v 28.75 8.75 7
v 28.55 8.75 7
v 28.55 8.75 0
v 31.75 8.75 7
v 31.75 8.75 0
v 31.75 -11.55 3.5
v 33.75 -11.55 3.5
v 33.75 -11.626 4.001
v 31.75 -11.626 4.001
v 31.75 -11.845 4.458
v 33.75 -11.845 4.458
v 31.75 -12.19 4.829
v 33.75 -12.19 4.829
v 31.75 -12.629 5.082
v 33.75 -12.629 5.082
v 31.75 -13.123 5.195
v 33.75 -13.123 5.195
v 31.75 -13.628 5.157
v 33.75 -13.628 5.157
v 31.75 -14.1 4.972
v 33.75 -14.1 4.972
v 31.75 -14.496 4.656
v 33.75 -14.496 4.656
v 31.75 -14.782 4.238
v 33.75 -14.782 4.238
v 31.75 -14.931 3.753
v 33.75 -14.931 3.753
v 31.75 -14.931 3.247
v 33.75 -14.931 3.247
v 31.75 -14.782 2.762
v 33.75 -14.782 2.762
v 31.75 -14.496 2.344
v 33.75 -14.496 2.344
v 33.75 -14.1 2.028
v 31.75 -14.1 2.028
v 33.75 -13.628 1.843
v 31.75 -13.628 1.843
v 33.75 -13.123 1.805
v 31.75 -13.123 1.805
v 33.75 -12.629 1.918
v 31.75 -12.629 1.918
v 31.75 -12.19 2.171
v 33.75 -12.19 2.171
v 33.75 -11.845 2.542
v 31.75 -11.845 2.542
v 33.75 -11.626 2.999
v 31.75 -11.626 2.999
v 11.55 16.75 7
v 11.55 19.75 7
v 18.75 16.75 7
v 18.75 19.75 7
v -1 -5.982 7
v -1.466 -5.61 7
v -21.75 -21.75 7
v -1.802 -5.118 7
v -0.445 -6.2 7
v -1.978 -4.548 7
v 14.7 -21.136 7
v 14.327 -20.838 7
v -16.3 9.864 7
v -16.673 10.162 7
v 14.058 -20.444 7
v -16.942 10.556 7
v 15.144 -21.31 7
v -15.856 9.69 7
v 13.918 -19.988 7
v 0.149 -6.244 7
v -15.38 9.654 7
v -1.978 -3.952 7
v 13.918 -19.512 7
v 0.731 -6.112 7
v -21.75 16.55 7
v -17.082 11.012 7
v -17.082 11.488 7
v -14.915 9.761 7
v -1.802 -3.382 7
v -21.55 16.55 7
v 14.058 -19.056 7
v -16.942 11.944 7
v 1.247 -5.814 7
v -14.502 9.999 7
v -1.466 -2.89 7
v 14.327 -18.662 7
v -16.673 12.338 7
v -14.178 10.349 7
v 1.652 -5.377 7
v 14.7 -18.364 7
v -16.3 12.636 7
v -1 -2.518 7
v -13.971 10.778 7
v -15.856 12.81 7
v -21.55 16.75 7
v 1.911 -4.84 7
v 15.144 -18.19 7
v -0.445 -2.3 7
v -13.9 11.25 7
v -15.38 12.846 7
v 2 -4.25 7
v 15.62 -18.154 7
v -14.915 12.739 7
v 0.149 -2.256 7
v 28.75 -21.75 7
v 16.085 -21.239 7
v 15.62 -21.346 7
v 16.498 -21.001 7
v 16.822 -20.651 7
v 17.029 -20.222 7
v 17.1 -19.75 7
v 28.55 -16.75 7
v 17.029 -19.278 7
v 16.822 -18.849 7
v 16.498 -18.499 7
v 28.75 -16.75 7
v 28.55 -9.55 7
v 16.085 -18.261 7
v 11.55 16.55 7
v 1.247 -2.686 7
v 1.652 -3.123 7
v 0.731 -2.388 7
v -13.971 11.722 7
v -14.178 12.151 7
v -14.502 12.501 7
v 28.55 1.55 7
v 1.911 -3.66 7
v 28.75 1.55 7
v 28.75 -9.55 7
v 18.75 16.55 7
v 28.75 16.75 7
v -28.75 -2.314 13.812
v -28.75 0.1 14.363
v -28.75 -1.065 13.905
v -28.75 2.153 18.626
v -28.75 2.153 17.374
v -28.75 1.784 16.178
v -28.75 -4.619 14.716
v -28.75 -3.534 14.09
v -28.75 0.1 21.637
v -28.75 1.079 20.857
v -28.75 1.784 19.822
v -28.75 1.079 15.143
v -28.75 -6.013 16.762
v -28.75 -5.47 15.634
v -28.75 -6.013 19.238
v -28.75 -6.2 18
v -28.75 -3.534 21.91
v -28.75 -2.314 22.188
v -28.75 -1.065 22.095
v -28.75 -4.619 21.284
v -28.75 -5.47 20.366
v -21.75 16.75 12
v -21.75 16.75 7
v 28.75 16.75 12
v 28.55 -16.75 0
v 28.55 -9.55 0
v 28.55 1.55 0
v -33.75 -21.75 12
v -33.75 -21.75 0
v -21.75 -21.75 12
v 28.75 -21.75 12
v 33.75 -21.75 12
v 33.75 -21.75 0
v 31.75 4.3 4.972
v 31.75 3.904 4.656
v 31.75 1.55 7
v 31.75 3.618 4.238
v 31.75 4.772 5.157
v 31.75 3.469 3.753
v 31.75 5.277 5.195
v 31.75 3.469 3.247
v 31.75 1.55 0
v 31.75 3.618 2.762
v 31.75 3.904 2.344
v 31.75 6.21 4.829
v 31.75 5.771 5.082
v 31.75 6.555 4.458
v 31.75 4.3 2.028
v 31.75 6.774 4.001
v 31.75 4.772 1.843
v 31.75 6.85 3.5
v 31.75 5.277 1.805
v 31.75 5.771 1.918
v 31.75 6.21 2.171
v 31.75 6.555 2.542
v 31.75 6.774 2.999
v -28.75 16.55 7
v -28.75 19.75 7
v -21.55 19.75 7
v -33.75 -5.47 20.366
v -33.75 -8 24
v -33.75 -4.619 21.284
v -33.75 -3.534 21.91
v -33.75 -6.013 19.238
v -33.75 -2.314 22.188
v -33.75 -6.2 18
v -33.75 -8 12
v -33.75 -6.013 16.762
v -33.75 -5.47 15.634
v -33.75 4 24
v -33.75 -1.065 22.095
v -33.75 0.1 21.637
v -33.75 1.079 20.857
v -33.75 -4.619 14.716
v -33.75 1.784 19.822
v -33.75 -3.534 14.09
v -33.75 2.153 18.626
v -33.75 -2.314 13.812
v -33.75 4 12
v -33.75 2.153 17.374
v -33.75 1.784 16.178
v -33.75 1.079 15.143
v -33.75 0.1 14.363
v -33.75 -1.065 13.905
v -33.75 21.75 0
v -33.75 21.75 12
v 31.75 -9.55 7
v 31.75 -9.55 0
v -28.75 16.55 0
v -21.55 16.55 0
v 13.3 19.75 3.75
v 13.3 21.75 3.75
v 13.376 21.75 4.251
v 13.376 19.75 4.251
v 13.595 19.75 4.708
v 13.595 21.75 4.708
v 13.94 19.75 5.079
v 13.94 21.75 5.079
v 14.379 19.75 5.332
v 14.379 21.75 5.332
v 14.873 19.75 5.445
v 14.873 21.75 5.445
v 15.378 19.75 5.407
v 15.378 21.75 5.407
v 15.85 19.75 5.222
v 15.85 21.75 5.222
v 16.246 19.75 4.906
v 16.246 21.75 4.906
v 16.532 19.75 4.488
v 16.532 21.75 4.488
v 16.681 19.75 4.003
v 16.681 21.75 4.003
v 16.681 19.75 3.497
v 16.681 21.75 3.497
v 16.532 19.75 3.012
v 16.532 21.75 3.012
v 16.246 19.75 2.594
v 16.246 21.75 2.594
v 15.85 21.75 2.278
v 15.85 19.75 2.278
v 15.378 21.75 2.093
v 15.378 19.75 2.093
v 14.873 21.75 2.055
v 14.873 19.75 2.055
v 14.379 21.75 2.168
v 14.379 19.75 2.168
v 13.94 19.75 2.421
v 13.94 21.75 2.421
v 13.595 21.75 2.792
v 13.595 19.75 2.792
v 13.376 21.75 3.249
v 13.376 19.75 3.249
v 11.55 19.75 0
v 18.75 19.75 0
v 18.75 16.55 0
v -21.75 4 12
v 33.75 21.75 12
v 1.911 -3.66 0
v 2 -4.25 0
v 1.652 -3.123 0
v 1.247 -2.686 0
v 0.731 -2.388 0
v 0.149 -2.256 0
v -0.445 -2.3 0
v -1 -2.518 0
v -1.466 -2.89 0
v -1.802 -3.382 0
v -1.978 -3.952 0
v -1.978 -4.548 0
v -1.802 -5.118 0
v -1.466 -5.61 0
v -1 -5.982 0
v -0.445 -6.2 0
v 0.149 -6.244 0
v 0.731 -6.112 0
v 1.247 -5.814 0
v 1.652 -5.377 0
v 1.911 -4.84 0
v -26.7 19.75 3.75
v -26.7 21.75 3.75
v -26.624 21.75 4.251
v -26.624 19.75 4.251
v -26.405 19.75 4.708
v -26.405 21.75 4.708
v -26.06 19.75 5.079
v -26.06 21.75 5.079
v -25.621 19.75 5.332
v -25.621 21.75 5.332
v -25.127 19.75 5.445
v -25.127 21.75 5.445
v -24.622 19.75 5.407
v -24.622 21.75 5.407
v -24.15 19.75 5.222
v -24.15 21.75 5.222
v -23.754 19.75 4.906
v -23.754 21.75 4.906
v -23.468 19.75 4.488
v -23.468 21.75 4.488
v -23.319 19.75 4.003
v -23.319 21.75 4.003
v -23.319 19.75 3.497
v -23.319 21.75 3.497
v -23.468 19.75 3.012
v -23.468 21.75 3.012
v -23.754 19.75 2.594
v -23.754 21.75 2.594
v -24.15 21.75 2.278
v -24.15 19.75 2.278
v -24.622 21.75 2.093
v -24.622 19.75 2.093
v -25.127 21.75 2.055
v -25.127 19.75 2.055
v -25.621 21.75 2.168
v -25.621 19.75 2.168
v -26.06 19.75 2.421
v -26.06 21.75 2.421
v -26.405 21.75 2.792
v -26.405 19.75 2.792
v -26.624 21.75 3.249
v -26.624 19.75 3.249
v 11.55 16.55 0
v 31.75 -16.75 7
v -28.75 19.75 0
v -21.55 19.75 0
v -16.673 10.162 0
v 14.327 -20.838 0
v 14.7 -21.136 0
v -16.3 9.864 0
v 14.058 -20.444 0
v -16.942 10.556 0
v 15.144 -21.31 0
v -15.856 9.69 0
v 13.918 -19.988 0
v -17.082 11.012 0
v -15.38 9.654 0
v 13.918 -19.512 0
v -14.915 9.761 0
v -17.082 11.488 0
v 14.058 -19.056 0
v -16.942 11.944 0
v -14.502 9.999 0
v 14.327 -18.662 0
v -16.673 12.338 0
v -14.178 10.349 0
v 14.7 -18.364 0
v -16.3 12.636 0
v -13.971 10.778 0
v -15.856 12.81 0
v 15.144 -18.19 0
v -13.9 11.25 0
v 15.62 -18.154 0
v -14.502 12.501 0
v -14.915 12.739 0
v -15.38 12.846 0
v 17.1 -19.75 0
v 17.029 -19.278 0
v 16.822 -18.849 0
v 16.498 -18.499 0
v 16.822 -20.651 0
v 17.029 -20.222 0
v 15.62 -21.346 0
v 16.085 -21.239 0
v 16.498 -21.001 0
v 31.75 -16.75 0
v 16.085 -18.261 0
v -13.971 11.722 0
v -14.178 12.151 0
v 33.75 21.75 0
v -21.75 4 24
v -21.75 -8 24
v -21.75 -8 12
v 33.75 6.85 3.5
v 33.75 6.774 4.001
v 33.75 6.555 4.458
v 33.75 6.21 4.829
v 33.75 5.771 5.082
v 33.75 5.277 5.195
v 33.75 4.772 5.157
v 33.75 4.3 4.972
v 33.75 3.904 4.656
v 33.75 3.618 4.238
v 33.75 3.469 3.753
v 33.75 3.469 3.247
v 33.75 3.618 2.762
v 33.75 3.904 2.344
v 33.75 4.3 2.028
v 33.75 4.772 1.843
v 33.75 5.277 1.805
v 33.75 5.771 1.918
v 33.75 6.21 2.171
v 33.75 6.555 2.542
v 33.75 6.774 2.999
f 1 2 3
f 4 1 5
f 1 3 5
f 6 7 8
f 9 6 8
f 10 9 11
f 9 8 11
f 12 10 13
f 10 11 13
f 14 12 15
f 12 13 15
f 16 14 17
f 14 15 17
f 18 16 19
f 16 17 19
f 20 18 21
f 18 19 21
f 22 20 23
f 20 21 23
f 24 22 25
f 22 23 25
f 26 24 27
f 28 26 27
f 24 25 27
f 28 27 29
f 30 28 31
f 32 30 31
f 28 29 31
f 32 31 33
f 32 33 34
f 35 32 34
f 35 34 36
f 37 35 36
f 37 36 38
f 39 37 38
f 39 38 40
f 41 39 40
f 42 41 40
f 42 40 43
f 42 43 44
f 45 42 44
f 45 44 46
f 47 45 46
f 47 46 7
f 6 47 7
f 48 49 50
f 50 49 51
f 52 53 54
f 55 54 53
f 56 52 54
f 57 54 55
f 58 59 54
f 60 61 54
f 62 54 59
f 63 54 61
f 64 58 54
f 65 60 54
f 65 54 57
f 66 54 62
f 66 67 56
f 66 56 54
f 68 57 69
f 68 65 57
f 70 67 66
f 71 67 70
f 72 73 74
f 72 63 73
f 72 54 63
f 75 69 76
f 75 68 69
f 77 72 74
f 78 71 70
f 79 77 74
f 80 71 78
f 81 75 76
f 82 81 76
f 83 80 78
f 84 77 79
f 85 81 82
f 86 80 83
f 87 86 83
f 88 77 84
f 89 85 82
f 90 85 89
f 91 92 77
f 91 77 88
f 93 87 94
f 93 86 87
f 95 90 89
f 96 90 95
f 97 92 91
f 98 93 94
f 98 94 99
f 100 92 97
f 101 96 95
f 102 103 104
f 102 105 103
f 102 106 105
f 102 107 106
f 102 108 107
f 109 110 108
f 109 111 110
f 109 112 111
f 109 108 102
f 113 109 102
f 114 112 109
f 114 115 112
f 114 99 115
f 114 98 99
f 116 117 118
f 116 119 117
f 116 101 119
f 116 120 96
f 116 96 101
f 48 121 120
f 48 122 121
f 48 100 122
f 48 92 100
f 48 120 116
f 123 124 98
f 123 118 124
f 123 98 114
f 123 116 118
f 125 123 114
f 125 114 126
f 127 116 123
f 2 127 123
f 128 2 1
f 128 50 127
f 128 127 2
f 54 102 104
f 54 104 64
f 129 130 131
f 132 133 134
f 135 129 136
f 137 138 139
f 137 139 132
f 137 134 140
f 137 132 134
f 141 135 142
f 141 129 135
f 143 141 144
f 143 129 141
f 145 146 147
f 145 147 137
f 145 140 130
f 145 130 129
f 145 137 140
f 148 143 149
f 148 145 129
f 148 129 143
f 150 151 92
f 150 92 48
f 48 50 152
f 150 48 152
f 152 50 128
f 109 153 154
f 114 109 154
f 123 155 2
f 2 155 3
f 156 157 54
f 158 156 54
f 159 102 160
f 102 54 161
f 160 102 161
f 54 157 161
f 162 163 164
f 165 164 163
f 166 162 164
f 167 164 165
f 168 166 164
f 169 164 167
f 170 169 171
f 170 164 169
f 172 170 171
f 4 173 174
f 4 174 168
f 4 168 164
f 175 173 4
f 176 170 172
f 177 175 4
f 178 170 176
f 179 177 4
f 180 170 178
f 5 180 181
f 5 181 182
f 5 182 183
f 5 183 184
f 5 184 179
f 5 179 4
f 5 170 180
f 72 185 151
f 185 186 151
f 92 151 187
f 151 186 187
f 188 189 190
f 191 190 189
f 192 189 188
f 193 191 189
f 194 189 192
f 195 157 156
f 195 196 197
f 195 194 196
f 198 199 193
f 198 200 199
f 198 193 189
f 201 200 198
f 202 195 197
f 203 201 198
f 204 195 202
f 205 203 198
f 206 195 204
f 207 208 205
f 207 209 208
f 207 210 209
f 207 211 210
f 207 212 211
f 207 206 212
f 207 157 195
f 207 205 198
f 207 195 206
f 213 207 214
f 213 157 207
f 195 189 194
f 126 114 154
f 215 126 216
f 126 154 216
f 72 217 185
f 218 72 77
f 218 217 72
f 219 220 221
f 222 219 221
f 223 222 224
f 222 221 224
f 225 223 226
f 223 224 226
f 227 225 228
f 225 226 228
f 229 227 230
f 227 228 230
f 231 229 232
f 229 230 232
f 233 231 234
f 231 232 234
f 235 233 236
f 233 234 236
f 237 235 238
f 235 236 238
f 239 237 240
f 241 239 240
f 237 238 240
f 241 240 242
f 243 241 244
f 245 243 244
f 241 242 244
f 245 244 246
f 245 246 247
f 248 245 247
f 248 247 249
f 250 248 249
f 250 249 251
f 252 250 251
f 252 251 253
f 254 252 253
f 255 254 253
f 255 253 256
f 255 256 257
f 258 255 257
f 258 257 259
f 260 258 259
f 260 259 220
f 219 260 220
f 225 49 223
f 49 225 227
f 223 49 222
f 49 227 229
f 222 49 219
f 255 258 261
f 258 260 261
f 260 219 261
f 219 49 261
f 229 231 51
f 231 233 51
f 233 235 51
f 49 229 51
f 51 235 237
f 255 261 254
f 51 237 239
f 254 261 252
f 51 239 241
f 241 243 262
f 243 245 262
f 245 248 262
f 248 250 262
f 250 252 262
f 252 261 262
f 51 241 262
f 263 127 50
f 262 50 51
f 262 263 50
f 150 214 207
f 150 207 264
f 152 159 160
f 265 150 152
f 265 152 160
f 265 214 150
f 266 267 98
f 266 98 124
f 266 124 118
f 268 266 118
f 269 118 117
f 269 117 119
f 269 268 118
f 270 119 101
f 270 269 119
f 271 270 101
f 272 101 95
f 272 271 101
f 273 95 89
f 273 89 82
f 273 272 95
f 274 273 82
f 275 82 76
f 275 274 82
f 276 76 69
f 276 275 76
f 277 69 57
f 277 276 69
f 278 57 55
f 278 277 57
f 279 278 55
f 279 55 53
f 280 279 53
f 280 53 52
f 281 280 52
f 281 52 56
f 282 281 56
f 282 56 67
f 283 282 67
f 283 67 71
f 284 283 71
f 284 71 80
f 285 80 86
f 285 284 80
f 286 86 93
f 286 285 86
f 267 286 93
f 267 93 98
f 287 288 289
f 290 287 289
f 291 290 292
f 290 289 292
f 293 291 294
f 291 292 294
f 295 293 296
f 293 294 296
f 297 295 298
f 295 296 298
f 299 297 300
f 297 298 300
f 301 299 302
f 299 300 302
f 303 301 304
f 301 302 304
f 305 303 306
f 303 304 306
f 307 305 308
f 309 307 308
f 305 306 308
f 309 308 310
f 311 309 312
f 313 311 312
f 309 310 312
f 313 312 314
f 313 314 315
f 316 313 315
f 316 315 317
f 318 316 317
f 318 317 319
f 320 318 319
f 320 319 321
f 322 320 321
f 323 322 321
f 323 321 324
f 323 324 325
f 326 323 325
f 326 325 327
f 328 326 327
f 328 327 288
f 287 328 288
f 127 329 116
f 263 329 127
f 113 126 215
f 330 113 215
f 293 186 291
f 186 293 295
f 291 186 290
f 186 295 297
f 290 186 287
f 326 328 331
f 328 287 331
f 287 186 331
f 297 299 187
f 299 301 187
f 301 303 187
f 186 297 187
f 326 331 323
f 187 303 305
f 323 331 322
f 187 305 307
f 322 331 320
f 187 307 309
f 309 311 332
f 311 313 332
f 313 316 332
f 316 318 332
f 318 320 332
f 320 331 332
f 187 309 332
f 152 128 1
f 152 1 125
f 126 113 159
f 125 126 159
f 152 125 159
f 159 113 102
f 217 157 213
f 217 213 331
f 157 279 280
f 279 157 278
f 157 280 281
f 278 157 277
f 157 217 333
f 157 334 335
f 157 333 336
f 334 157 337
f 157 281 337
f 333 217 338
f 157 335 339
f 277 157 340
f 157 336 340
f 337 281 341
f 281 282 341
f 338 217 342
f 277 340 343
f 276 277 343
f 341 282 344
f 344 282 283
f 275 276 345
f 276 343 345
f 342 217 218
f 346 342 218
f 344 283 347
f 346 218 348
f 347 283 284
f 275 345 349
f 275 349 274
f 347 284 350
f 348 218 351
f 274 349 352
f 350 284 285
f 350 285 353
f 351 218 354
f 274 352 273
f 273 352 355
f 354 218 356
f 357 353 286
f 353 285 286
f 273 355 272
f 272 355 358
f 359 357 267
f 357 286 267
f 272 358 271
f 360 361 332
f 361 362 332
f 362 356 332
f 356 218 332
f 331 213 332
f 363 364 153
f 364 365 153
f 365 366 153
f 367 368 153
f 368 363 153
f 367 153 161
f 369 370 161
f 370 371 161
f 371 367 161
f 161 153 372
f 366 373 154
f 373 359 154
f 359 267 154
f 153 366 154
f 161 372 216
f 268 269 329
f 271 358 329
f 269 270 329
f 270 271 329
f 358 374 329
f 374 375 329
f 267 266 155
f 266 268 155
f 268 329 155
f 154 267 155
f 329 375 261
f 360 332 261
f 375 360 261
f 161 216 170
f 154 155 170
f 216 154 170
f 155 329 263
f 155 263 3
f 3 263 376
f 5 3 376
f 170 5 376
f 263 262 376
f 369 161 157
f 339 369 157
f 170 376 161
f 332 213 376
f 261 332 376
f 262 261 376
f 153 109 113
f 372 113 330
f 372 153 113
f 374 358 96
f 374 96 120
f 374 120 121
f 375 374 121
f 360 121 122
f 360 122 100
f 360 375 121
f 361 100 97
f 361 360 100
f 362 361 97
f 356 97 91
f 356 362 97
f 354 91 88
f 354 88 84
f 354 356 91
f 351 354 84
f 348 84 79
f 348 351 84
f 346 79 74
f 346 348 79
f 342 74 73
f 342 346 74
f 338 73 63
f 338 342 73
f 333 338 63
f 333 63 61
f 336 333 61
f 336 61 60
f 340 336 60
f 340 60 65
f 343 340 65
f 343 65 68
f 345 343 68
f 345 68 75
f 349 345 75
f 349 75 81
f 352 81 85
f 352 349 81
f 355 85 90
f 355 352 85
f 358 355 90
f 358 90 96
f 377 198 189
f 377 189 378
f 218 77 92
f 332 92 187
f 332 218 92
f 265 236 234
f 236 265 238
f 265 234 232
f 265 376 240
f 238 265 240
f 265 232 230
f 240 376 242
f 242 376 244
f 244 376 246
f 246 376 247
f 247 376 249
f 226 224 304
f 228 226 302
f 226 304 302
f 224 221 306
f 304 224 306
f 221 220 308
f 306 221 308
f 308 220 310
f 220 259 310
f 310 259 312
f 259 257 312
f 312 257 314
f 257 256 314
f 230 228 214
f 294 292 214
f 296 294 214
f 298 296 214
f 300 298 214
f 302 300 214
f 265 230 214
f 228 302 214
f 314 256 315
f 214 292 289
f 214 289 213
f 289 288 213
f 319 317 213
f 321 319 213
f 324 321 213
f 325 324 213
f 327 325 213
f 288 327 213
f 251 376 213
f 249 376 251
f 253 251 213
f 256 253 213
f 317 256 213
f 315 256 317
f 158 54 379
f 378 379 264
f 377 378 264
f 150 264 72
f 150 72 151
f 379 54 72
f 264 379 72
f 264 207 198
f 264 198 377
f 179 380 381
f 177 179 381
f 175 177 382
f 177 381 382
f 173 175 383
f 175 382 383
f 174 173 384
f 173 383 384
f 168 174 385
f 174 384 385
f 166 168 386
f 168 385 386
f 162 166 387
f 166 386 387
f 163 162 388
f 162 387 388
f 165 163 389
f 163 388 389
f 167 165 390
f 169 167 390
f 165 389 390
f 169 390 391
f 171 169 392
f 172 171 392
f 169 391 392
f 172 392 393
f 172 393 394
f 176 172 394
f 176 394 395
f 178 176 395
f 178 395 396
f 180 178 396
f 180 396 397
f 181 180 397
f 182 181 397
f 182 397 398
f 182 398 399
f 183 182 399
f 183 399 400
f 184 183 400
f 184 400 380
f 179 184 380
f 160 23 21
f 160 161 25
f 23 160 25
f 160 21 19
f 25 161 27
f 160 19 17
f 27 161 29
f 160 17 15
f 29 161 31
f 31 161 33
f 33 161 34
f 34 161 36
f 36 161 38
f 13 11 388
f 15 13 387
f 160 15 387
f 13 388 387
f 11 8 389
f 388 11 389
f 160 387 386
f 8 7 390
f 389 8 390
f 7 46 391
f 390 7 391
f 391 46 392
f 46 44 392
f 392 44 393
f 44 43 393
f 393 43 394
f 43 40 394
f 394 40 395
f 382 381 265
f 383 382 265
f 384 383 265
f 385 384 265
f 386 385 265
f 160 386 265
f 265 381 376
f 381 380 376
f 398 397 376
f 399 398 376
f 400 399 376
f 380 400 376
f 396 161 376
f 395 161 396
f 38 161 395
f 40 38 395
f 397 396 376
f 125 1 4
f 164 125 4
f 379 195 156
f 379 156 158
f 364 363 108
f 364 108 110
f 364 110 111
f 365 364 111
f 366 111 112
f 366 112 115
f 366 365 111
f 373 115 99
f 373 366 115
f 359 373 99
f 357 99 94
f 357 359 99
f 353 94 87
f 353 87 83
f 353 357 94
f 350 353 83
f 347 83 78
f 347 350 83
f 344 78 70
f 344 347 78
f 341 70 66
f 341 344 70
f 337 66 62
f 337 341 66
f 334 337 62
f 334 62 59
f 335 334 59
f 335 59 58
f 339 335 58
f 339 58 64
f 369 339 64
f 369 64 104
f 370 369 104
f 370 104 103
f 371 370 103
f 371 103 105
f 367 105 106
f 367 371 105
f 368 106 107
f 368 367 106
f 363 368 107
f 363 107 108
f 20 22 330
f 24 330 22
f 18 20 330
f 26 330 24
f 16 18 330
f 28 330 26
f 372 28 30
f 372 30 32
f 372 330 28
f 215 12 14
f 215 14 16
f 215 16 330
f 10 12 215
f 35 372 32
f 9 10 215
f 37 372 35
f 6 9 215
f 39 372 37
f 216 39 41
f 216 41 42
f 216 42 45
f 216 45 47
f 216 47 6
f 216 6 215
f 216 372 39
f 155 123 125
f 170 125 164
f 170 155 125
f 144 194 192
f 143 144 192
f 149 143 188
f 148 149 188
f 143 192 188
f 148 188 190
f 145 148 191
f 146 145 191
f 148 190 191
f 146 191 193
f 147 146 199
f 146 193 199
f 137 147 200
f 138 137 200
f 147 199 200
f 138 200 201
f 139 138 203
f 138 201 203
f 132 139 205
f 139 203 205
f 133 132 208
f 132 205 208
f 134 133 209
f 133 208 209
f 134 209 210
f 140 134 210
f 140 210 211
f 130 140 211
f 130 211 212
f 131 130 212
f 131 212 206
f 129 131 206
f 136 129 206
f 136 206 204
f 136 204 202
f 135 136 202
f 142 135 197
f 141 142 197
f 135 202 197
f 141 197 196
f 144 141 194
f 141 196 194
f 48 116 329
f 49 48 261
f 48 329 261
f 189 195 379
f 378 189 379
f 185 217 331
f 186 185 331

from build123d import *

# Parameters (mm, degrees)
SKETCH_W        = 67.5
SKETCH_H        = 43.5
SKETCH_R        = 2
SKETCH_R_2      = 1.6
SKETCH_W_2      = 7.2
SKETCH_H_2      = 3.2
SKETCH_W_3      = 3.2
SKETCH_H_3      = 7.2
PAD_DEPTH       = 7
PAD001_DEPTH    = 5
SKETCH002_W     = 12
SKETCH002_H     = 12
PAD002_DEPTH    = 12
SKETCH003_R     = 4.2
POCKET_DEPTH    = 5
SKETCH004_R     = 1.7
POCKET001_DEPTH = 5
SKETCH005_R     = 1.7
POCKET002_DEPTH = 5


with BuildPart() as part:
    # Sketch → Pad (new body)
    with BuildSketch(Plane.XY):
        Rectangle(SKETCH_W, SKETCH_H)
        with Locations((0, -4.25)):
            Circle(SKETCH_R, mode=Mode.SUBTRACT)
        with Locations((-15.5, 11.25)):
            Circle(SKETCH_R_2, mode=Mode.SUBTRACT)
        with Locations((15.5, -19.75)):
            Circle(SKETCH_R_2, mode=Mode.SUBTRACT)
        with Locations((15.15, 18.15)):
            Rectangle(SKETCH_W_2, SKETCH_H_2, mode=Mode.SUBTRACT)
        with Locations((-25.15, 18.15)):
            Rectangle(SKETCH_W_2, SKETCH_H_2, mode=Mode.SUBTRACT)
        with Locations((30.15, 5.15)):
            Rectangle(SKETCH_W_3, SKETCH_H_3, mode=Mode.SUBTRACT)
        with Locations((30.15, -13.15)):
            Rectangle(SKETCH_W_3, SKETCH_H_3, mode=Mode.SUBTRACT)
    extrude(amount=PAD_DEPTH)

    # Sketch001 → Pad001 (new body)
    with BuildSketch(Plane.XY.offset(7)):
        Polygon((28.75, -21.75), (33.75, -21.75), (33.75, 21.75), (-33.75, 21.75), (-33.75, -21.75), (-21.75, -21.75), (-21.75, 16.75), (28.75, 16.75), align=None)
    extrude(amount=PAD001_DEPTH)

    # Sketch002 → Pad002 (new body)
    with BuildSketch(Plane.XY.offset(12)):
        with Locations((-27.75, -2)):
            Rectangle(SKETCH002_W, SKETCH002_H)
    extrude(amount=PAD002_DEPTH)

    # Sketch003 → Pocket (cut)
    with BuildSketch(Plane(origin=(-33.75, 0, 0), x_dir=(0, -1, 0), z_dir=(-1, 0, 0))):
        with Locations((2, 18)):
            Circle(SKETCH003_R)
    extrude(amount=-POCKET_DEPTH, mode=Mode.SUBTRACT)

    # Sketch004 → Pocket001 (cut)
    with BuildSketch(Plane(origin=(0, 21.75, 0), x_dir=(-1, 0, 0), z_dir=(0, 1, 0))):
        with Locations((25, 3.75)):
            Circle(SKETCH004_R)
        with Locations((-15, 3.75)):
            Circle(SKETCH004_R)
    extrude(amount=-POCKET001_DEPTH, mode=Mode.SUBTRACT)

    # Sketch005 → Pocket002 (cut)
    with BuildSketch(Plane.YZ.offset(33.75)):
        with Locations((5.15, 3.5)):
            Circle(SKETCH005_R)
        with Locations((-13.25, 3.5)):
            Circle(SKETCH005_R)
    extrude(amount=-POCKET002_DEPTH, mode=Mode.SUBTRACT)


solid = part.part
